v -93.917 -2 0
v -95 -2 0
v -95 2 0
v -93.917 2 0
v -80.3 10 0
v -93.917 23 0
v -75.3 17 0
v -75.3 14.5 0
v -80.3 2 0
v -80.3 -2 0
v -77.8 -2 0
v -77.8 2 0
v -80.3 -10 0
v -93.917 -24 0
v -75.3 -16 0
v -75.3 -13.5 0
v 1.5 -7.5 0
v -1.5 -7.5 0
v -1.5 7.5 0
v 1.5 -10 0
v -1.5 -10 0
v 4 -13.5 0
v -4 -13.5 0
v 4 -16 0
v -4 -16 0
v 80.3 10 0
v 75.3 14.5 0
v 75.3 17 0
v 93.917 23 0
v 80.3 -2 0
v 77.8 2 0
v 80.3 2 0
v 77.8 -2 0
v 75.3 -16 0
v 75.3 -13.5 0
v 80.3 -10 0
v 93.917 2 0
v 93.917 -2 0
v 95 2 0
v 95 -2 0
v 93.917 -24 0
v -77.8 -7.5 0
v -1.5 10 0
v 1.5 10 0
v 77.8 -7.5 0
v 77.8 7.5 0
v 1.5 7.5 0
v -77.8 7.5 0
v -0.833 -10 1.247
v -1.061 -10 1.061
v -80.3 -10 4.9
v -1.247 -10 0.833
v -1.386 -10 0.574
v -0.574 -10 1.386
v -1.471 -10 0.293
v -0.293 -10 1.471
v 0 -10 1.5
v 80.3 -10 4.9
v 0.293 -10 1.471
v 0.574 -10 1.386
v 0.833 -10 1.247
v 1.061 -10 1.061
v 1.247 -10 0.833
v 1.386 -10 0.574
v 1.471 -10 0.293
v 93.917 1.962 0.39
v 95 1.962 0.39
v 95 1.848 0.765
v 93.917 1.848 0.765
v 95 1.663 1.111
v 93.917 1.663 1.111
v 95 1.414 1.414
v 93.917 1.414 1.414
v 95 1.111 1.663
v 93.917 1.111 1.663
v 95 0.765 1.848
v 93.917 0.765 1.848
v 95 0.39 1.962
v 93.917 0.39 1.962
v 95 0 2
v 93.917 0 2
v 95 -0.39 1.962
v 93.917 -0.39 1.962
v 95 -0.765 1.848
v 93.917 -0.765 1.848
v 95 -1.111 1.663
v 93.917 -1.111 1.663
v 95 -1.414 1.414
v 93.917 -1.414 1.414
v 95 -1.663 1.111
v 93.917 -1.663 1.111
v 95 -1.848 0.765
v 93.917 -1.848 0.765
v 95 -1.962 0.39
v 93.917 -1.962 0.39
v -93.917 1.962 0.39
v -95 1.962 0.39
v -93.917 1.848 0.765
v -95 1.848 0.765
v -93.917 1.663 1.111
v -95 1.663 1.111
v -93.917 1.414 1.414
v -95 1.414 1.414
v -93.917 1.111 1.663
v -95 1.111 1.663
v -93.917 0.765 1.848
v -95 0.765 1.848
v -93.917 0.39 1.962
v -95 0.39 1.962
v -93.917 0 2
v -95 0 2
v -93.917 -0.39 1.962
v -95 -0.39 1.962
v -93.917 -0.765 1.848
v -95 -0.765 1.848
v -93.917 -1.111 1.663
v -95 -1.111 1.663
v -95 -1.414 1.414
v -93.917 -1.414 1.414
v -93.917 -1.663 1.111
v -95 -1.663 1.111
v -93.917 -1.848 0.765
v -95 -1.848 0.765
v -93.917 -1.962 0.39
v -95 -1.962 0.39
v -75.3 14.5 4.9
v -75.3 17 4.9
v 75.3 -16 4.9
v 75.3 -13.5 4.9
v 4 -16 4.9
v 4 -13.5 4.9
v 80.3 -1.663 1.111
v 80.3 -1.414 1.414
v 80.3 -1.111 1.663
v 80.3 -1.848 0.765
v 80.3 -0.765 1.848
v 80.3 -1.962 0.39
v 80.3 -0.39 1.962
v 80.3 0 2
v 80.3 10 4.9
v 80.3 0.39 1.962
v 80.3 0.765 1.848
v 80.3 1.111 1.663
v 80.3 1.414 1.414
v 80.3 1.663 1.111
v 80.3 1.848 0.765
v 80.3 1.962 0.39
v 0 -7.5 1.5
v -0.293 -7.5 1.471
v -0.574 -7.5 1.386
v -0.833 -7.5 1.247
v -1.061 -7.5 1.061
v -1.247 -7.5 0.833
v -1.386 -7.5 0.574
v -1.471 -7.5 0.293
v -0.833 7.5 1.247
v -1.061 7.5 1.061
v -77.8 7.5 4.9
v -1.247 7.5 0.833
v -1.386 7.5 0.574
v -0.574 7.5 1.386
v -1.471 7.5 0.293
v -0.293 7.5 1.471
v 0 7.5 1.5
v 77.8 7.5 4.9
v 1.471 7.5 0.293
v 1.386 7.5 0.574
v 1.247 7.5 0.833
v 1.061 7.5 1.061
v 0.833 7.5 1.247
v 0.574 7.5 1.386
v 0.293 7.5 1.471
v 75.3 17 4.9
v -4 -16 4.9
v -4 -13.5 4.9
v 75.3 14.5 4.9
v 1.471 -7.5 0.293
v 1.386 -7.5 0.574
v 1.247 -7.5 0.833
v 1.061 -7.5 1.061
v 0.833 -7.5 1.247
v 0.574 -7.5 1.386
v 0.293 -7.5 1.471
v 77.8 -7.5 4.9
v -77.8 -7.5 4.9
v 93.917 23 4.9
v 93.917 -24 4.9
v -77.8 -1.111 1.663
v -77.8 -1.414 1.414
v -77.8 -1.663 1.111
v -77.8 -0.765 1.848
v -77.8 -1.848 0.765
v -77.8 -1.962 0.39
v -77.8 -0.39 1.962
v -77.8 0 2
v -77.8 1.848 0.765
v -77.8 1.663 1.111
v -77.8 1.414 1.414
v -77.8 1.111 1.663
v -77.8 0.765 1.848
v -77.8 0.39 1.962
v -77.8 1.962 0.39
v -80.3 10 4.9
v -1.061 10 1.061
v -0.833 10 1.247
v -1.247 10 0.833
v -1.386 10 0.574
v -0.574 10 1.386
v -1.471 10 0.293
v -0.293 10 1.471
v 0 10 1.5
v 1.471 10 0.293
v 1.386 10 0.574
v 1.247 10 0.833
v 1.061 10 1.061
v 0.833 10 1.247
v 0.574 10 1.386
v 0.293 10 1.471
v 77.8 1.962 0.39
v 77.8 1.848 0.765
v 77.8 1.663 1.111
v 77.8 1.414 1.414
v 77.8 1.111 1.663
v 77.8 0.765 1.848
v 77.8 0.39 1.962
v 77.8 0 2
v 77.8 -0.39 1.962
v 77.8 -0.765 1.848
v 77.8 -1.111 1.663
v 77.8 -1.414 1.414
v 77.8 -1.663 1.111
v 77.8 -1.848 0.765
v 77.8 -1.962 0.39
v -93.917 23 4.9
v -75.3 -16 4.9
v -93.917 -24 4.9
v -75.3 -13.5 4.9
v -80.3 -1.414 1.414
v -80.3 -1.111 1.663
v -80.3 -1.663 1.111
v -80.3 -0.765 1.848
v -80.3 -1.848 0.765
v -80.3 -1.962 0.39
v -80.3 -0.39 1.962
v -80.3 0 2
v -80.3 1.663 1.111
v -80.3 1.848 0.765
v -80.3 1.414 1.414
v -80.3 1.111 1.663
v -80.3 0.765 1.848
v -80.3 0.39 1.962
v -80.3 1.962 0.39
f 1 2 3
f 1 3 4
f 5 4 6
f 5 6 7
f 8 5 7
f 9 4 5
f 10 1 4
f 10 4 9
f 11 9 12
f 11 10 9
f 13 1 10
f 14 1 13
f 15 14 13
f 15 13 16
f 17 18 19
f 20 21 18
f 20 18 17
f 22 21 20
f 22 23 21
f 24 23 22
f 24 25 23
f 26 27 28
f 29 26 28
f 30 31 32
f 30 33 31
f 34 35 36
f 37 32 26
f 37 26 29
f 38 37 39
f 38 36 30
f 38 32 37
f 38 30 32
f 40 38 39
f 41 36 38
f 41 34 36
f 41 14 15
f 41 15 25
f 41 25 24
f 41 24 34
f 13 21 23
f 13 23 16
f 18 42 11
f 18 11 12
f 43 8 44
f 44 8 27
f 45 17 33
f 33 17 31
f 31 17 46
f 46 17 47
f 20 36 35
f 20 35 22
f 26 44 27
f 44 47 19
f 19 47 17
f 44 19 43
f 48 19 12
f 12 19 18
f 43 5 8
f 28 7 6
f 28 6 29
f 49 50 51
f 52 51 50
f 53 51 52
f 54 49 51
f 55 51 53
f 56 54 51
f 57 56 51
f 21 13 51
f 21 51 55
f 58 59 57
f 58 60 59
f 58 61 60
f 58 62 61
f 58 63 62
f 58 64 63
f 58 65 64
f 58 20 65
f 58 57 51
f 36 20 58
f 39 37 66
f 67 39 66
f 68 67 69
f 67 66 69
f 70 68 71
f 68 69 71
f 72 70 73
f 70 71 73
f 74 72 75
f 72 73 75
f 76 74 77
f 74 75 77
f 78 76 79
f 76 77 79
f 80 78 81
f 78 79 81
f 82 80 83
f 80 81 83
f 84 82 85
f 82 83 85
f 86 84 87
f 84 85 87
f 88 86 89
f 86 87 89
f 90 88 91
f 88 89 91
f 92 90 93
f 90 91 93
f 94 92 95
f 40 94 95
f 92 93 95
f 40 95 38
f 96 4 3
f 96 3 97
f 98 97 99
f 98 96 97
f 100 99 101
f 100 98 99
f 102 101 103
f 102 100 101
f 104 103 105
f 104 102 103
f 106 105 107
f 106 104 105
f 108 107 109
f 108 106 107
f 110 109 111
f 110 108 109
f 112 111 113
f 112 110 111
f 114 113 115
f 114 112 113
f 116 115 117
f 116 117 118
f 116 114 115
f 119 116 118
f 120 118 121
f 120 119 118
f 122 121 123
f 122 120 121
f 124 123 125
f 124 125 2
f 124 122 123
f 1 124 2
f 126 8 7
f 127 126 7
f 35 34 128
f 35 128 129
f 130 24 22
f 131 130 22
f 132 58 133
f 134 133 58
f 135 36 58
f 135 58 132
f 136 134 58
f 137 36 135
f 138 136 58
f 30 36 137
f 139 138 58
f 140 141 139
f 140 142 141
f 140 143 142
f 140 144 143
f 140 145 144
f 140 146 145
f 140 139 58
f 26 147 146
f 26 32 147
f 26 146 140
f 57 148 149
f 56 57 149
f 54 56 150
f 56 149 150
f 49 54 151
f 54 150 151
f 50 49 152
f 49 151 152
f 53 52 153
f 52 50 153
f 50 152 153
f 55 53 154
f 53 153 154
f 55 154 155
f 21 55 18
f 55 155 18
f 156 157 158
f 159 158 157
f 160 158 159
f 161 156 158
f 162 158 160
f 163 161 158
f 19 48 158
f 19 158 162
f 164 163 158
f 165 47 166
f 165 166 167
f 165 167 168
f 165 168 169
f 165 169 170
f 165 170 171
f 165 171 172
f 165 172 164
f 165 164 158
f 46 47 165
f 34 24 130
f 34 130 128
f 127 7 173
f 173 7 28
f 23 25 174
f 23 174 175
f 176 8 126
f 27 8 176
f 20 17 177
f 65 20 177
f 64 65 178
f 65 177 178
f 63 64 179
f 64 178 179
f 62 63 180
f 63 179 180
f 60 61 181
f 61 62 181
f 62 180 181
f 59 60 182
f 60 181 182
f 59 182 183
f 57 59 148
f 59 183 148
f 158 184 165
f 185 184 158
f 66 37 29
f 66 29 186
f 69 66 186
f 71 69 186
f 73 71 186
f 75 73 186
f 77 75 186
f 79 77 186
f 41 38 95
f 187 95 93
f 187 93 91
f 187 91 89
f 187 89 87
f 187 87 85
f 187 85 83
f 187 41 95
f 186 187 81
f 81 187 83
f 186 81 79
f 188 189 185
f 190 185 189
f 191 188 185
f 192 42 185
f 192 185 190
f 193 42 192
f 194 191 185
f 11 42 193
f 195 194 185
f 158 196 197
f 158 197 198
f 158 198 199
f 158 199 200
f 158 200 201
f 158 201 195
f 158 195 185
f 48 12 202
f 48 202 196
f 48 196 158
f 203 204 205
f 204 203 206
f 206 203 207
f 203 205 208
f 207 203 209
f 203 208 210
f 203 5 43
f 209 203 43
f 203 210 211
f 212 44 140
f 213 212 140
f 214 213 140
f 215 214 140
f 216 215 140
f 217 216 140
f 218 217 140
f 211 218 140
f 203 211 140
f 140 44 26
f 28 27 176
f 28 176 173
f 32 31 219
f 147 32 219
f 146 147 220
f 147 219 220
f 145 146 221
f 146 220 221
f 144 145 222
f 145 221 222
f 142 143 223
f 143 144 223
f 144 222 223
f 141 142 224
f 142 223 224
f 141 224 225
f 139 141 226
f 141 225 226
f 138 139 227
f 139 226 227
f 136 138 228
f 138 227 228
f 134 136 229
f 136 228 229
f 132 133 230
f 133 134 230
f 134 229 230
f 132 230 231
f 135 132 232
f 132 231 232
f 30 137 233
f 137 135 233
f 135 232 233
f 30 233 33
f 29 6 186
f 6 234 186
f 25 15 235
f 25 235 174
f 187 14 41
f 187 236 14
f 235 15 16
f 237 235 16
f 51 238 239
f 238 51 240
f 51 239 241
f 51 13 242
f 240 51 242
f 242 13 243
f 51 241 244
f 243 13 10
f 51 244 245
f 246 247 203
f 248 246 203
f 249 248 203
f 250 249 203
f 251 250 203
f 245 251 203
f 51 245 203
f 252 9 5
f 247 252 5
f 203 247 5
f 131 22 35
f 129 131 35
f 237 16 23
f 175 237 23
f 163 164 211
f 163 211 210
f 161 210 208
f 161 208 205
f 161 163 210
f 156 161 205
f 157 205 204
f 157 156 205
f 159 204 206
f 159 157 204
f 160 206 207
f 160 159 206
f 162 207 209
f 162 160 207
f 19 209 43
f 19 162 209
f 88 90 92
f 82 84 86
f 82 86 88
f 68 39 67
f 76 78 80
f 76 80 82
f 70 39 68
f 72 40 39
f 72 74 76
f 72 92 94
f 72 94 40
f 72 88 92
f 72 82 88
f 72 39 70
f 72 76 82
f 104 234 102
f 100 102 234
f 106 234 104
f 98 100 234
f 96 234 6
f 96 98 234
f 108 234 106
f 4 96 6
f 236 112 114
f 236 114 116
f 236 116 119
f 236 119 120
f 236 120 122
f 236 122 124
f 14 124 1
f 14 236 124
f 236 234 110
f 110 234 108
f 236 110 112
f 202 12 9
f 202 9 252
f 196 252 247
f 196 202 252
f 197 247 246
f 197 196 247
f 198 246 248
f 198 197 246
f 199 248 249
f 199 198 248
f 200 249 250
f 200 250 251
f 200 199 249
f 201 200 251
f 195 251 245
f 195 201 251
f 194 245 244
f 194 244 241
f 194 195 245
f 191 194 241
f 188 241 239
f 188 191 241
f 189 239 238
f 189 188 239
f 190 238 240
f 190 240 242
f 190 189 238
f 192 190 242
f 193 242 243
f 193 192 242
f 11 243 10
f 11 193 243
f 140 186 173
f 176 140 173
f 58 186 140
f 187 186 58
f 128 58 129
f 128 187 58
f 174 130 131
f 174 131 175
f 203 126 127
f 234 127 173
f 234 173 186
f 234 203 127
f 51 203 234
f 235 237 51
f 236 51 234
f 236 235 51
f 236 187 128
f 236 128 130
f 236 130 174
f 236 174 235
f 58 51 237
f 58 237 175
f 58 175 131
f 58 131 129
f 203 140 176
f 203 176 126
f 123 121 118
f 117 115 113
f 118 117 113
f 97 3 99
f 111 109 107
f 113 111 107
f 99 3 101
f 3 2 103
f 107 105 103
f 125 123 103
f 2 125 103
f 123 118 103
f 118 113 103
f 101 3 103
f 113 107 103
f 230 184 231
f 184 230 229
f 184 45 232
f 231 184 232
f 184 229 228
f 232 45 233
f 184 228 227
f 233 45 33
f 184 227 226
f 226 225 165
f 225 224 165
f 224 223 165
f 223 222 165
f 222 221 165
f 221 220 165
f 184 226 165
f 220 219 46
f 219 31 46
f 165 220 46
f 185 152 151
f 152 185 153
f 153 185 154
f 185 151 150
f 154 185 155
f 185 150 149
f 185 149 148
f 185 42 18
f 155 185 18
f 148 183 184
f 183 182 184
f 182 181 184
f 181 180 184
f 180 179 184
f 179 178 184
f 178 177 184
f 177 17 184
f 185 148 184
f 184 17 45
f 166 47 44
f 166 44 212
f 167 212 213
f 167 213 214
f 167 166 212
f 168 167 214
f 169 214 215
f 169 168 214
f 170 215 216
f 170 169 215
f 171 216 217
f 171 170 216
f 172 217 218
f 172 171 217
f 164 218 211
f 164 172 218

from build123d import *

# Parameters (mm, degrees)
F3_DEPTH      = 24
F3_DEPTH_BACK = 23
F2_W          = 150.6
F2_H          = 2.5
F2_W_2        = 71.3
F2_W_3        = 160.6
F2_H_2        = 20
F2_W_4        = 155.6
F2_H_3        = 15
F4_DEPTH      = 4.9
F7_DEPTH      = 95
F7_DEPTH_BACK = 95
F8_DEPTH      = 12
F8_DEPTH_BACK = 12
F9_DEPTH      = 4.75


with BuildPart() as f3:
    # F1 (on Front) → F3 (new body, two sides)
    with BuildSketch(Plane.XZ) as f3_sk:
        Polygon((-93.9166666667, 0), (0, 0), (93.9166666667, 0), (93.9166666667, 4.9), (0, 4.9), (-93.9166666667, 4.9), align=None)
    extrude(amount=F3_DEPTH)
    extrude(f3_sk.sketch, amount=-F3_DEPTH_BACK)

    # F2 (on Top) → F4 (cut, through all)
    with BuildSketch(Plane.XY):
        with Locations((0, 15.75)):
            Rectangle(F2_W, F2_H)
        with Locations((39.65, -14.75)):
            Rectangle(F2_W_2, F2_H)
        with Locations((-39.65, -14.75)):
            Rectangle(F2_W_2, F2_H)
        Rectangle(F2_W_3, F2_H_2)
        Rectangle(F2_W_4, F2_H_3, mode=Mode.SUBTRACT)
    extrude(amount=F4_DEPTH, mode=Mode.SUBTRACT)

    # F6 (on Right) → F7 (join, two sides)
    with BuildSketch(Plane.YZ) as f7_sk:
        with BuildLine():
            Line((-2, 0), (2, 0))
            ThreePointArc((2, 0), (0, 2), (-2, 0))
        make_face()
    extrude(amount=F7_DEPTH)
    extrude(f7_sk.sketch, amount=-F7_DEPTH_BACK)

    # F0 (on Front) → F8 (join, two sides)
    with BuildSketch(Plane.XZ) as f8_sk:
        with BuildLine():
            Line((0, 1.5), (0, 0))
            Line((0, 0), (1.5, 0))
            ThreePointArc((1.5, 0), (1.0606601718, 1.0606601718), (0, 1.5))
        make_face()
        with BuildLine():
            ThreePointArc((0, 1.5), (-1.0606601718, 1.0606601718), (-1.5, 0))
            Line((-1.5, 0), (0, 0))
            Line((0, 0), (0, 1.5))
        make_face()
    extrude(amount=F8_DEPTH)
    extrude(f8_sk.sketch, amount=-F8_DEPTH_BACK)

    # F2 (on Top) → F9 (join)
    with BuildSketch(Plane.XY):
        Rectangle(F2_W_4, F2_H_3)
    extrude(amount=F9_DEPTH)


solid = f3.part
